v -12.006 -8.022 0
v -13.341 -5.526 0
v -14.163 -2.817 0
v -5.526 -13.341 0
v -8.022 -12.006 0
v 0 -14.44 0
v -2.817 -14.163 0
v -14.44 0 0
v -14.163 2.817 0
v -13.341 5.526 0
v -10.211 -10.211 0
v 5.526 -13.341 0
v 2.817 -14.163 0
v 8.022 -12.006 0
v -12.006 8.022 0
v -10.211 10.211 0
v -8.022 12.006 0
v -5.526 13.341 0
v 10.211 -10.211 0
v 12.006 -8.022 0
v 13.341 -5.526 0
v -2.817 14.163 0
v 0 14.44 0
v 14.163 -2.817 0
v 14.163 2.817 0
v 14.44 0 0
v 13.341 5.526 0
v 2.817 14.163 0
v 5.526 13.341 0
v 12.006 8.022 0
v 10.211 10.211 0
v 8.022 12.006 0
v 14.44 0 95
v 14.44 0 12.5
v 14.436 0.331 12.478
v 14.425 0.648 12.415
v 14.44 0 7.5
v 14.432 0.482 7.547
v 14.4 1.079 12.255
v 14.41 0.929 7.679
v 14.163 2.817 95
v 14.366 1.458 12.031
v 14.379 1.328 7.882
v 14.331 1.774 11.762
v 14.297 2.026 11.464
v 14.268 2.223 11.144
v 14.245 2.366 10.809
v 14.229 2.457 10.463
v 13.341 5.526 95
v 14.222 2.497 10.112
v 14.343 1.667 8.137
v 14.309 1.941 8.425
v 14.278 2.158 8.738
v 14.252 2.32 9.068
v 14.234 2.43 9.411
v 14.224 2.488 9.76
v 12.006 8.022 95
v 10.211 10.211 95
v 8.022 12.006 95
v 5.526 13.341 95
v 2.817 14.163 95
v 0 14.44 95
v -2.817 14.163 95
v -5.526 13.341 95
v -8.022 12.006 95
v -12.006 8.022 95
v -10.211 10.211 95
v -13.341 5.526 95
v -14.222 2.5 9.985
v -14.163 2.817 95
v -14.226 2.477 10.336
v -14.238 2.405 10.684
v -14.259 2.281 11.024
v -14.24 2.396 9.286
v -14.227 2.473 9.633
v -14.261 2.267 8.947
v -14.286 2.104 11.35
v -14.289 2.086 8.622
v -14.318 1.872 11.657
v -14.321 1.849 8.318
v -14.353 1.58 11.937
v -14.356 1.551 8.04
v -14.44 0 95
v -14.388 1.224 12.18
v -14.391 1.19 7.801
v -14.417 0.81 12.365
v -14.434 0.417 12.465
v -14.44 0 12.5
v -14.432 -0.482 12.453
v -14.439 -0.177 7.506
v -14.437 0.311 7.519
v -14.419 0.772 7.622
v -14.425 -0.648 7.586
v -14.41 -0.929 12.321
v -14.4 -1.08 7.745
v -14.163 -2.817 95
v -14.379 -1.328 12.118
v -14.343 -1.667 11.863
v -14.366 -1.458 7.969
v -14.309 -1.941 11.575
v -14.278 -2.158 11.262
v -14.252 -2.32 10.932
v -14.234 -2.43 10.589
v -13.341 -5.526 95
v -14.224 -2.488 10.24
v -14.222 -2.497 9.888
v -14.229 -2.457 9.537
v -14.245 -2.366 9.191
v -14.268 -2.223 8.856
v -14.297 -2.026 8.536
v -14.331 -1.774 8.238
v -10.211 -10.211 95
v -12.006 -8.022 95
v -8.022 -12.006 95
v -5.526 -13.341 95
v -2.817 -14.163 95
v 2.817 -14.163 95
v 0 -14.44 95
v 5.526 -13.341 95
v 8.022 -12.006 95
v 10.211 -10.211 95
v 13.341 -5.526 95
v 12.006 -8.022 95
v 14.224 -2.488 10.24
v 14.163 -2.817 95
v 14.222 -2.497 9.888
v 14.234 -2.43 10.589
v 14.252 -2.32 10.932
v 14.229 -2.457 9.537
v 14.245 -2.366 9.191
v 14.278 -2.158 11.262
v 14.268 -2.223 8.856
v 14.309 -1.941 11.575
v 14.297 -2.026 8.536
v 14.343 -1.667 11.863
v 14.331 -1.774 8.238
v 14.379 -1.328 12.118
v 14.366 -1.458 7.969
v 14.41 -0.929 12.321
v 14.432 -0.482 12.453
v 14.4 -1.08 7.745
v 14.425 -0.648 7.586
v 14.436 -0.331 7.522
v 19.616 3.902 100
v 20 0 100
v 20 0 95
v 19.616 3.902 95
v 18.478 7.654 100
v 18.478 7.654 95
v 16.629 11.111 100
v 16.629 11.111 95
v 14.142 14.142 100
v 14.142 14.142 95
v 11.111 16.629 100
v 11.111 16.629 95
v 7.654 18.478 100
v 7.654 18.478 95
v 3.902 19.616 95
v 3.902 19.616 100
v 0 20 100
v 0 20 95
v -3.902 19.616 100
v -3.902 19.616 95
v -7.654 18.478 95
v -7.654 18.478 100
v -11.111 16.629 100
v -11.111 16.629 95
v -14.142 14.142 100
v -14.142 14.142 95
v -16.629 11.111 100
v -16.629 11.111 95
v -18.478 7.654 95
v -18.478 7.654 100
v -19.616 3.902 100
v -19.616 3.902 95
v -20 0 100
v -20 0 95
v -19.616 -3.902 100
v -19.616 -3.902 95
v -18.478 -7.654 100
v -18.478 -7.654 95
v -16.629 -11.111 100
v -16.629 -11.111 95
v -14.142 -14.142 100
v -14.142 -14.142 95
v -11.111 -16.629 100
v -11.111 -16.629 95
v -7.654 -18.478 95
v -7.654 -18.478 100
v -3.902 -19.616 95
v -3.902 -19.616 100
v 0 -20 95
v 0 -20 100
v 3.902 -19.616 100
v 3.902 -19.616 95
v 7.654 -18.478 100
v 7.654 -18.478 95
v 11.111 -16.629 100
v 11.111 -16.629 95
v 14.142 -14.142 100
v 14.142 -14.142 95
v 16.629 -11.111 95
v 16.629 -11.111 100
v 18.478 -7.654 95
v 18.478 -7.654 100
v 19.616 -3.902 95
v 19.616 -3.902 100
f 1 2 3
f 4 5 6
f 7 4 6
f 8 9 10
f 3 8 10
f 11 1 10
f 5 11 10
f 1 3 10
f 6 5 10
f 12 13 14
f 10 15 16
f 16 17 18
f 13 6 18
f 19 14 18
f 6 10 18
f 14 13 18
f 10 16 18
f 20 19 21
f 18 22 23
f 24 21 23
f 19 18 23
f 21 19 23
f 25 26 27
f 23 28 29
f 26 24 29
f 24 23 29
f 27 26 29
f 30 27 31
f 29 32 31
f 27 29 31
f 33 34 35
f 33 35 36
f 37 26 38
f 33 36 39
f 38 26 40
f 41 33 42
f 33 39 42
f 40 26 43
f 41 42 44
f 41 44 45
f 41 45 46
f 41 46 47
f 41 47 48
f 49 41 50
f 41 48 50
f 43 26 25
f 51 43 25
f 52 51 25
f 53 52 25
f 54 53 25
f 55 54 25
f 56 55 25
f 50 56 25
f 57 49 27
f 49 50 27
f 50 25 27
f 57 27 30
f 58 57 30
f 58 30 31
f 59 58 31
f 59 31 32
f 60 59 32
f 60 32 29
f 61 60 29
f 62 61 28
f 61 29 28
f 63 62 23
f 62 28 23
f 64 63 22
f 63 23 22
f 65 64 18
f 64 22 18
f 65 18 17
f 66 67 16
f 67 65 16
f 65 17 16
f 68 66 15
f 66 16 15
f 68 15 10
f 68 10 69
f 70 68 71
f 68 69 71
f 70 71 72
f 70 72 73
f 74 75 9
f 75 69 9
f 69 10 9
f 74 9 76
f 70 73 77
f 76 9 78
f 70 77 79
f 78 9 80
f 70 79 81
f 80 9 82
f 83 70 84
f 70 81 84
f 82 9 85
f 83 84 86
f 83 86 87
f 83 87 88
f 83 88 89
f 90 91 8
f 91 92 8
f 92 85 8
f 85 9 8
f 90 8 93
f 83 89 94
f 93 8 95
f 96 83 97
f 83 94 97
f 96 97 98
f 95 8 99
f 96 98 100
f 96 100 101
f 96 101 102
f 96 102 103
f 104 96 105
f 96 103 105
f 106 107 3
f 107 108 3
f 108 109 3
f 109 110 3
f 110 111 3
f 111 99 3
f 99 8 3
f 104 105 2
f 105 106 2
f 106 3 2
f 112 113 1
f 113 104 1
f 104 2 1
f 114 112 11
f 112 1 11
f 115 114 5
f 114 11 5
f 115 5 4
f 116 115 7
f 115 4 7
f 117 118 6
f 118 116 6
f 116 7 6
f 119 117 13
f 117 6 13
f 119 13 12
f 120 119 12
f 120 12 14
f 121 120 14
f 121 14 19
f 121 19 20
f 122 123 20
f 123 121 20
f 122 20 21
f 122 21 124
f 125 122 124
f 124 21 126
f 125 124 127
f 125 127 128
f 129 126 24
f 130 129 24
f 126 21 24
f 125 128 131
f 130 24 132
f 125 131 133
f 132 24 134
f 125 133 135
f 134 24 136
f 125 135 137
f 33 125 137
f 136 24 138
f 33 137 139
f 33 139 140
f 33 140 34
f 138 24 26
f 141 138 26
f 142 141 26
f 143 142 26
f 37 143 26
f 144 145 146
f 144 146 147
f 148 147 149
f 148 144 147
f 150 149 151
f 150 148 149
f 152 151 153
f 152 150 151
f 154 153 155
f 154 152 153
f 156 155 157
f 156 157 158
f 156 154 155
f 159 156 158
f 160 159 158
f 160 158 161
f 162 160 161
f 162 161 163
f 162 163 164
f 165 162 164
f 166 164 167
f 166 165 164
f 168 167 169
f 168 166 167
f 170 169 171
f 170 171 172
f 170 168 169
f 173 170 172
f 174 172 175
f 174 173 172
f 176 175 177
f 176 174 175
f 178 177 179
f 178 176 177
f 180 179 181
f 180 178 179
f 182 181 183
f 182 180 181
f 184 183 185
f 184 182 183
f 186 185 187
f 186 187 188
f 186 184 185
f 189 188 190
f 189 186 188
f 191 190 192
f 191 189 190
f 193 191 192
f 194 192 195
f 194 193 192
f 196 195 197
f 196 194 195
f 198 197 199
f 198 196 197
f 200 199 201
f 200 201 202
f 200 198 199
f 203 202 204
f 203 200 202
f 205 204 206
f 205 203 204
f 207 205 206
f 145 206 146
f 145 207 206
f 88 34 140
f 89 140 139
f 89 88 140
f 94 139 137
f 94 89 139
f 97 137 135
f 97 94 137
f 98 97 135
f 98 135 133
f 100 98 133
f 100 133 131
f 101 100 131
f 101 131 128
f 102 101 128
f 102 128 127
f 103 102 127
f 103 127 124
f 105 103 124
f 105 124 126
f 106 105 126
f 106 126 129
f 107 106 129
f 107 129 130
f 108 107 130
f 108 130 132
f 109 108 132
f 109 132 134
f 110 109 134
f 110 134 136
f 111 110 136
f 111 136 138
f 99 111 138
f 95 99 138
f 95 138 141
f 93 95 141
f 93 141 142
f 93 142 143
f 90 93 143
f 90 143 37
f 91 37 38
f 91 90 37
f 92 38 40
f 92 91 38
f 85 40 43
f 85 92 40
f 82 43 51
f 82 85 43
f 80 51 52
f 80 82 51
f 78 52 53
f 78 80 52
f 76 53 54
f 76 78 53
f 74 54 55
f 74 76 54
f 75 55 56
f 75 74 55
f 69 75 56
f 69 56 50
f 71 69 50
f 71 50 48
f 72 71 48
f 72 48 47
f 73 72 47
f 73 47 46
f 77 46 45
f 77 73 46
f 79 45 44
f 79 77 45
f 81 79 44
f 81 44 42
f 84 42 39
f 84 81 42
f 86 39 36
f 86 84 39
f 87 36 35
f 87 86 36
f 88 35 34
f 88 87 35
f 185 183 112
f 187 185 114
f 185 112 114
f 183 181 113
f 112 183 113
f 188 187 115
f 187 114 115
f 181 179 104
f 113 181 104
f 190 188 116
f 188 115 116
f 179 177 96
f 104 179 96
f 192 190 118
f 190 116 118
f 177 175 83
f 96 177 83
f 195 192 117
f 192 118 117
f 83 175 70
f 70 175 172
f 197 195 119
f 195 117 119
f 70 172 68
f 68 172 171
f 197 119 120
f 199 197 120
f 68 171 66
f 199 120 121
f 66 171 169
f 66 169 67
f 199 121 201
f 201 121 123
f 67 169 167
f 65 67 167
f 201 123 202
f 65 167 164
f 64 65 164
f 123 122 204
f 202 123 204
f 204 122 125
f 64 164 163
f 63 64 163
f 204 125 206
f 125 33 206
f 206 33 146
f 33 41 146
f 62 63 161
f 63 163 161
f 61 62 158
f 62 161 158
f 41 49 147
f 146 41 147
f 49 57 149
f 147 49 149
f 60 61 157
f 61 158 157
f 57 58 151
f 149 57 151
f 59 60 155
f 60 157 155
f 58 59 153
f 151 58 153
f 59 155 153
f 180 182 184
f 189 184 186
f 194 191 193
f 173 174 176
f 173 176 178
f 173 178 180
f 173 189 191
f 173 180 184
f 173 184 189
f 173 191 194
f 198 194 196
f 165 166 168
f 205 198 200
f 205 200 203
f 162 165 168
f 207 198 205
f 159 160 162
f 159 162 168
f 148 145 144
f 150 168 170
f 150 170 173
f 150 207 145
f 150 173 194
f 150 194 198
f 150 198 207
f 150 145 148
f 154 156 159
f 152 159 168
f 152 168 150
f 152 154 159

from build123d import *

# Parameters (mm, degrees)
SKETCH_1_R               = 14.44
EXTRUDE_1_DEPTH          = 100
SKETCH_3_R               = 20
EXTRUDE_3_DEPTH          = 5
CUT_EXTRUDE_1_DEPTH      = 104.923048454
CUT_EXTRUDE_1_DEPTH_BACK = 104.923048454
SKETCH_4_R               = 2.5


with BuildPart() as part:
    # 草图1 → 凸台-拉伸1 (new body)
    with BuildSketch(Plane.XY):
        Circle(SKETCH_1_R)
    extrude(amount=EXTRUDE_1_DEPTH)

    # 草图3 → 凸台-拉伸3 (add)
    with BuildSketch(Plane.XY.offset(100)):
        Circle(SKETCH_3_R)
    extrude(amount=-EXTRUDE_3_DEPTH)

    # 草图4 → 切除-拉伸1 (cut, two sides: drawn at the far end of the back side and taken through both)
    with BuildSketch(Plane(origin=(0, 0, 0), x_dir=(0, 0, -1), z_dir=(1, 0, 0)).offset(-CUT_EXTRUDE_1_DEPTH_BACK)):
        with Locations(Location((-10, 0, 0), (0, 0, 180))):
            Circle(SKETCH_4_R)
    extrude(amount=CUT_EXTRUDE_1_DEPTH + CUT_EXTRUDE_1_DEPTH_BACK, mode=Mode.SUBTRACT)


solid = part.part
